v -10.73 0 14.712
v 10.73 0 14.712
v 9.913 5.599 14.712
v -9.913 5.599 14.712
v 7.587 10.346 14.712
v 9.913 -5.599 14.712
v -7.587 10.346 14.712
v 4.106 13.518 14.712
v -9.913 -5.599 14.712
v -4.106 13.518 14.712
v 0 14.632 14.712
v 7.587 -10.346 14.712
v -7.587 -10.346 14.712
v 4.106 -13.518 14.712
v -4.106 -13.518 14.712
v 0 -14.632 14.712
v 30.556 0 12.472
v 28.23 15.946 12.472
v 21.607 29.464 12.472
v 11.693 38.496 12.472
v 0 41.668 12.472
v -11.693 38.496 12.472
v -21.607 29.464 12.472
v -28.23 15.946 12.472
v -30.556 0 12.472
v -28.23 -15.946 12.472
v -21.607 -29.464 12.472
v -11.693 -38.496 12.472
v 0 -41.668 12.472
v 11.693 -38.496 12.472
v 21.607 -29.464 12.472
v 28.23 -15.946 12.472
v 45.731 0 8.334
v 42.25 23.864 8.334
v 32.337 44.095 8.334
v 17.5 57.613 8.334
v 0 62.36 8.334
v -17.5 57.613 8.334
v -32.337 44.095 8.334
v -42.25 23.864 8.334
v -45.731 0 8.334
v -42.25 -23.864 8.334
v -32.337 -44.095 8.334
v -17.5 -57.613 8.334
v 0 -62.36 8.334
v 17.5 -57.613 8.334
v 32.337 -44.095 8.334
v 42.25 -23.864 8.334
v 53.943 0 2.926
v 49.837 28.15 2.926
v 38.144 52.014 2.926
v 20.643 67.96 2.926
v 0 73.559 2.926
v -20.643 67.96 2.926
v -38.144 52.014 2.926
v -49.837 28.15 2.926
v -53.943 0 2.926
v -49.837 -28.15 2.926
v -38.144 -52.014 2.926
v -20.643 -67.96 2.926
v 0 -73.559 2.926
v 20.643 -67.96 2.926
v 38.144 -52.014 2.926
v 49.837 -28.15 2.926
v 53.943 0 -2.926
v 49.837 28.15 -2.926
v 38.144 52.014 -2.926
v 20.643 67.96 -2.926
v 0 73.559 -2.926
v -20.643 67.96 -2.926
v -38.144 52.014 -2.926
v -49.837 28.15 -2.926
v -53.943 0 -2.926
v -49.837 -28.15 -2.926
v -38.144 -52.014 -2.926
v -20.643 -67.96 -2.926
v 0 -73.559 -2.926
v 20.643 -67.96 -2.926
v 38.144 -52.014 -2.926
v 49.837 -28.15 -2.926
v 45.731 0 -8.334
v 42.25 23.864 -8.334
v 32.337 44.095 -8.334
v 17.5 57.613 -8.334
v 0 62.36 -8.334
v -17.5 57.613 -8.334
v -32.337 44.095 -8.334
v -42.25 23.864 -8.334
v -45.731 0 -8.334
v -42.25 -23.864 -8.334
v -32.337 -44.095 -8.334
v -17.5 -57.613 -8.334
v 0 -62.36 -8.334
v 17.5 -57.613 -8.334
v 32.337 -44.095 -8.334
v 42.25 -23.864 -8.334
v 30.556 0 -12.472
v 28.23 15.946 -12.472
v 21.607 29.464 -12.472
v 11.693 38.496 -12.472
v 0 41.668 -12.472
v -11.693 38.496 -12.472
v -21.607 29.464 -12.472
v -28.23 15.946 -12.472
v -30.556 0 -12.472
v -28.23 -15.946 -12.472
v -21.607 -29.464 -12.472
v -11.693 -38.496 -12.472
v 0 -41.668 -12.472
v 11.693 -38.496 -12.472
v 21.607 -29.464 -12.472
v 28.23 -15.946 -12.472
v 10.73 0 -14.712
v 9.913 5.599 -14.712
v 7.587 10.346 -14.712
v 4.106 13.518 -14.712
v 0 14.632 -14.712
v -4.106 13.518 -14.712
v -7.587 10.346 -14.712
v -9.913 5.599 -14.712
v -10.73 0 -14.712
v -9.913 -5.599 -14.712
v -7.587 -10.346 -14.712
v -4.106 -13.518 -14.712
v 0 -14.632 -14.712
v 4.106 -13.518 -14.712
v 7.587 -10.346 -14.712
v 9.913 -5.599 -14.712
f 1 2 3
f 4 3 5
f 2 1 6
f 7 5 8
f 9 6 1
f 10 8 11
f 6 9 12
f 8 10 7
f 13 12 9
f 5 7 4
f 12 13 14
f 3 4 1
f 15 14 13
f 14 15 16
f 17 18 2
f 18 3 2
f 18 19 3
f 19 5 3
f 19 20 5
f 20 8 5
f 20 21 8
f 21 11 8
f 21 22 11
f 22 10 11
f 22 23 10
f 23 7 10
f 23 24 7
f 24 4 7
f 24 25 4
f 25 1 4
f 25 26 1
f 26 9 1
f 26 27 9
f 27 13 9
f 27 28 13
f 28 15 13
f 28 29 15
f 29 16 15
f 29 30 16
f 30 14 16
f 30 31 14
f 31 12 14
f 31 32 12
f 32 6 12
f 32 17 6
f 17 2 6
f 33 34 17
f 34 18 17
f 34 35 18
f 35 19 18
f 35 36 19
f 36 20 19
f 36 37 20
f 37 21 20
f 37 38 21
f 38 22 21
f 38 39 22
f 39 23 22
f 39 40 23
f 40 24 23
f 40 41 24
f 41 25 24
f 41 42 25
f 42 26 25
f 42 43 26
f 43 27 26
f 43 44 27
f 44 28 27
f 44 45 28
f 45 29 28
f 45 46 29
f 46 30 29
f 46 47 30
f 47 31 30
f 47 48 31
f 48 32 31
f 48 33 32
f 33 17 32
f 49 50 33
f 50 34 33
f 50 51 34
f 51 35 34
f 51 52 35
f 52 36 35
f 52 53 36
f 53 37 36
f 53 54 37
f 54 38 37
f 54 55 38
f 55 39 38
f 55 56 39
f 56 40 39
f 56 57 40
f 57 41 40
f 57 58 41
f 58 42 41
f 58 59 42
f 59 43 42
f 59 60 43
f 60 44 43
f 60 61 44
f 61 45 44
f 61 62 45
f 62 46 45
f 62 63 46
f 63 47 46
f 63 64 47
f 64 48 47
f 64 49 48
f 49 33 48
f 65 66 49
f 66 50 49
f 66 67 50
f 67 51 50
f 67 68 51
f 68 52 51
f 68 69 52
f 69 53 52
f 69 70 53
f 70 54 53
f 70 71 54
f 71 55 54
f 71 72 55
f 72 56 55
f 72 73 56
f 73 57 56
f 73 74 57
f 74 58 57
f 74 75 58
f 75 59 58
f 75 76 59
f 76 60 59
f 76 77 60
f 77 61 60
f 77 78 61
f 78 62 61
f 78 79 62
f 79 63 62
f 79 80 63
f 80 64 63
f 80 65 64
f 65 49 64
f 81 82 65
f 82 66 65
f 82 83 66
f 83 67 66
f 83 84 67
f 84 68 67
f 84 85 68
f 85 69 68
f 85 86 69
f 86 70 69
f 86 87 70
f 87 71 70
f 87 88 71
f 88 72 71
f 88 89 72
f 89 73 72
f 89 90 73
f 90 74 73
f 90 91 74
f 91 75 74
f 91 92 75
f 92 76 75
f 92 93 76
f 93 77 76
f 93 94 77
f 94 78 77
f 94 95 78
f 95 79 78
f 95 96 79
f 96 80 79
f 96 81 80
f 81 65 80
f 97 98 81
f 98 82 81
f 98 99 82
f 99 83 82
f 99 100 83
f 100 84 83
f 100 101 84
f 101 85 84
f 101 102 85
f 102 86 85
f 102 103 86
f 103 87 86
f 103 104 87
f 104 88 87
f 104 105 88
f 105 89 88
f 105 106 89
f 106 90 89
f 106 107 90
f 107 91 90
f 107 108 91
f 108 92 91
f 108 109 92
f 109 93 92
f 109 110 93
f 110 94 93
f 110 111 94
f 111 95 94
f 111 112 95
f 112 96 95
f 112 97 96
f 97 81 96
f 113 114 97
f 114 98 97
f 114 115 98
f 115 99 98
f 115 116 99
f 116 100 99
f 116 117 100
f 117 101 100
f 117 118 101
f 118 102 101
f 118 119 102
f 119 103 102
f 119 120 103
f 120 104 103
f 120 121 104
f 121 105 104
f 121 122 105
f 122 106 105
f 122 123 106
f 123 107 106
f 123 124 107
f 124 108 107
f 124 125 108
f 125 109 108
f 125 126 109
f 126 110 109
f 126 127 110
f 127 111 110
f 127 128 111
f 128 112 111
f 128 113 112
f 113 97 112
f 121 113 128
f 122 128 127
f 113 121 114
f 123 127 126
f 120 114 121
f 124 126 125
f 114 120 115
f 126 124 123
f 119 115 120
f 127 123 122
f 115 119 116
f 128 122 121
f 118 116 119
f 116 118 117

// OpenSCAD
// Generated by SolidPython 1.0.1 on 2020-07-29 00:46:50


scale(v = [11, 15, 3]) {
	sphere(r = 5);
}
/***********************************************
*********      SolidPython code:      **********
************************************************
 
# import packages: SolidPython
from solid import *
from solid.utils import *
from itertools import chain, combinations, permutations


class Resize:

    def __init__(self, scad_file):
        self.scad_file = scad_file
        #self.scad_file = import_scad(scad_file)
        # cone/cylinder param:
        self.r1 = 0
        self.r2 = 0
        self.h = 0
        # rectangular prism param:
        self.w = 0
        self.l = 0
        # ellipse param:
        self.r = 0

    # import OpenScad code (file name corresponds to shape)


    # classify shape + parameters
    def assign(self, param1, param2, param3):
        if self.scad_file == 'cone.scad':
            self.r1 = param1
            self.r2 = param2
            self.h = param3
        elif self.scad_file == 'cylinder.scad':
            self.r1 = param1
            self.r2 = param2
            self.h = param3
        elif self.scad_file == 'rectangularPrism.scad':
            self.h = param1
            self.l = param2
            self.w = param3
        else:
            self.r = param1
            self.h = param2

    # resize parameters
    def iterate(self):
        x = range(3, 20, 2)
        i = 1
        if self.scad_file == 'cone.scad':
            tempList = list(permutations(x, 2))
            for temp in tempList:
                param1 = temp[0]
                param2 = temp[1]
                filepath = 'produced_scad_files/' + 'cone' + str(param1) + '_' + str(param2) + '_' + '.scad'
                scad_render_to_file(cylinder(h=param1, r1=param2, r2=0), filepath)

        elif self.scad_file == 'cylinder.scad':
            tempList = list(permutations(x, 3))
            for temp in tempList:
                param1 = temp[0]
                param2 = temp[1]
                filepath = 'produced_scad_files/' + 'cylinder' + str(param1) + '_' + str(param2) + '_' + '.scad'
                scad_render_to_file(cylinder(h=param1, r1=param2, r2=param2), filepath)

        elif self.scad_file == 'rectangularPrism.scad':
            tempList = list(permutations(x, 3))
            for temp in tempList:
                param1 = temp[0]
                param2 = temp[1]
                param3 = temp[2]
                filepath = 'produced_scad_files/' + 'rectangularPrism' + str(param1) + '_' + str(param2) + '_' + str(
                    param3) + '.scad'
                scad_render_to_file(cube(size=(param1, param2, param3)), filepath)

        elif self.scad_file == 'ellipse.scad':
            tempList = list(permutations(x, 4))
            for temp in tempList:
                param1 = temp[0]
                param2 = temp[1]
                param3 = temp[2]
                param4 = temp[3]
                filepath = 'produced_scad_files/' + 'ellipse' + str(param1) + '_' + str(param2) + '_' + str(param3) + '_' + str(param4) + '.scad'
                scad_render_to_file(scale([param1, param2, param3])(sphere(r=param4)), filepath)

    def render_to_scadfile(self):
        scad_render_to_file(scad, 'example.scad') 
 
************************************************/
